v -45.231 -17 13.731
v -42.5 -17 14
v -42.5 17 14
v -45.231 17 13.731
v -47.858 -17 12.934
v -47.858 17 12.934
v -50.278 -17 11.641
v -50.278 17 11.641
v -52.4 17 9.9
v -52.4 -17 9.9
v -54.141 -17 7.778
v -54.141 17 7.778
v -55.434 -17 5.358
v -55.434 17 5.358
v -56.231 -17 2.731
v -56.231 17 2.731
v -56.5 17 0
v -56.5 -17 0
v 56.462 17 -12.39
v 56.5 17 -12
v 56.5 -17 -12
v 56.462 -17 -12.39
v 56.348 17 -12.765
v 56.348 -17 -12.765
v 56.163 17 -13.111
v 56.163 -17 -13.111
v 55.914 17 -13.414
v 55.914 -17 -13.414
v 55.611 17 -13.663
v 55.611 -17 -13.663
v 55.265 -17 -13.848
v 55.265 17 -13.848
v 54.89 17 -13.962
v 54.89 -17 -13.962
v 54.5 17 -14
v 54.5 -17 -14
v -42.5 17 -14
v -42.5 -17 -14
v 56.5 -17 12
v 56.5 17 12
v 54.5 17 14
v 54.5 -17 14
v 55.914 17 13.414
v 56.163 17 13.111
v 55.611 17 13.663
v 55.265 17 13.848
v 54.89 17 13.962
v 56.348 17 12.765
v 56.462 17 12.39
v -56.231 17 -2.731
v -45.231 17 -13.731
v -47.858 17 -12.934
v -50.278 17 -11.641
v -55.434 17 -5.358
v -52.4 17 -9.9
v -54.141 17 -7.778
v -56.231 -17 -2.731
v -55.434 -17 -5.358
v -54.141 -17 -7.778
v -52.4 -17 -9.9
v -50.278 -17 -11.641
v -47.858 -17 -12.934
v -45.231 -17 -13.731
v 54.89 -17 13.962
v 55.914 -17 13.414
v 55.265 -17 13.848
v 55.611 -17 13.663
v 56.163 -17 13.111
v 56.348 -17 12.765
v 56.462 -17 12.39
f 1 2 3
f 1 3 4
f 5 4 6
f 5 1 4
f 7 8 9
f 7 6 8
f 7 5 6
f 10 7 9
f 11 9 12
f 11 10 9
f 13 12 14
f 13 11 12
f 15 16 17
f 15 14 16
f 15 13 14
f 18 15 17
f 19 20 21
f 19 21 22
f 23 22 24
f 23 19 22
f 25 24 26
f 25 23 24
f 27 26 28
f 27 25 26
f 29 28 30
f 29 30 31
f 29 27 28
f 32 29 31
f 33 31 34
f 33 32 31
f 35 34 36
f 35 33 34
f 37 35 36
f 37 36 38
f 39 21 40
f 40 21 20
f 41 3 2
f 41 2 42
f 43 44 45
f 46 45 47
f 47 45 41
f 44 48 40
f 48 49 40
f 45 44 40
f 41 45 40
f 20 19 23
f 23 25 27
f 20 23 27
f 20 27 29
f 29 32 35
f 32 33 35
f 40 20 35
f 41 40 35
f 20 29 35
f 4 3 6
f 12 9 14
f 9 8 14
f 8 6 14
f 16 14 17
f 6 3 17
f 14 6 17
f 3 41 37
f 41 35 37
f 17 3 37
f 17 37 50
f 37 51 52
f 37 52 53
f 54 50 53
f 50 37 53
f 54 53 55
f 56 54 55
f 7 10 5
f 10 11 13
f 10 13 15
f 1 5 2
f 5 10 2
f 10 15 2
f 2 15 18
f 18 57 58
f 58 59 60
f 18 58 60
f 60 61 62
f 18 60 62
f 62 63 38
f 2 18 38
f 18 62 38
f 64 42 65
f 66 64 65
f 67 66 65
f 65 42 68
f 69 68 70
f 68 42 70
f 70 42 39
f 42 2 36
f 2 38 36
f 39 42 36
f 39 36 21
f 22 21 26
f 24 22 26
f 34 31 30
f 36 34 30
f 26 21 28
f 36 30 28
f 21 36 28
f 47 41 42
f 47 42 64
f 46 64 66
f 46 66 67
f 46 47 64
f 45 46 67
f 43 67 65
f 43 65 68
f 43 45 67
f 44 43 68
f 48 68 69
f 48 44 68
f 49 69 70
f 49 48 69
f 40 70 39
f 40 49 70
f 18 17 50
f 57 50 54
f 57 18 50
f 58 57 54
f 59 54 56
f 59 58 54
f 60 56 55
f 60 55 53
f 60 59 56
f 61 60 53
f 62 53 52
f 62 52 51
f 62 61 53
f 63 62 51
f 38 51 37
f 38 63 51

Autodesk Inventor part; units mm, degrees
ref_plane "YZ Plane" through (0, 0, 0) normal (1, 0, 0) x (0, 1, 0)
ref_plane "XZ Plane" through (0, 0, 0) normal (0, 1, 0) x (-1, 0, 0)
ref_plane "XY Plane" through (0, 0, 0) normal (0, 0, 1) x (1, 0, 0)
sketch "スケッチ1" plane through (0, 0, 0) normal (0, 0, 1) x (1, 0, 0)
  line L0 (-56.5, -17) -> (56.5, -17)
  line L1 (56.5, -17) -> (56.5, 17)
  line L2 (56.5, 17) -> (-56.5, 17)
  line L3 (-56.5, 17) -> (-56.5, -17)
  line L4 (-56.5, -17) -> (56.5, 17) construction
  line L5 (56.5, -17) -> (-56.5, 17) construction
  point P0 (0, 0)
  dimension "d0" = 113
  dimension "d1" = 34
extrude "押し出し1" add sketch "スケッチ1" along normal blind 14
mirror "ミラー1" about plane through (0, 0, 0) normal (0, 0, -1) of "押し出し1"
fillet "フィレット1" radius 14 2 edges at (-56.5, 0, 14) (-56.5, 0, -14)
fillet "フィレット2" radius 2 2 edges at (56.5, 0, 14) (56.5, 0, -14)
properties part number "バッテリー(G6 HI-VOLTAGE 2400MAH 3S 80CMAX LIPO)"
